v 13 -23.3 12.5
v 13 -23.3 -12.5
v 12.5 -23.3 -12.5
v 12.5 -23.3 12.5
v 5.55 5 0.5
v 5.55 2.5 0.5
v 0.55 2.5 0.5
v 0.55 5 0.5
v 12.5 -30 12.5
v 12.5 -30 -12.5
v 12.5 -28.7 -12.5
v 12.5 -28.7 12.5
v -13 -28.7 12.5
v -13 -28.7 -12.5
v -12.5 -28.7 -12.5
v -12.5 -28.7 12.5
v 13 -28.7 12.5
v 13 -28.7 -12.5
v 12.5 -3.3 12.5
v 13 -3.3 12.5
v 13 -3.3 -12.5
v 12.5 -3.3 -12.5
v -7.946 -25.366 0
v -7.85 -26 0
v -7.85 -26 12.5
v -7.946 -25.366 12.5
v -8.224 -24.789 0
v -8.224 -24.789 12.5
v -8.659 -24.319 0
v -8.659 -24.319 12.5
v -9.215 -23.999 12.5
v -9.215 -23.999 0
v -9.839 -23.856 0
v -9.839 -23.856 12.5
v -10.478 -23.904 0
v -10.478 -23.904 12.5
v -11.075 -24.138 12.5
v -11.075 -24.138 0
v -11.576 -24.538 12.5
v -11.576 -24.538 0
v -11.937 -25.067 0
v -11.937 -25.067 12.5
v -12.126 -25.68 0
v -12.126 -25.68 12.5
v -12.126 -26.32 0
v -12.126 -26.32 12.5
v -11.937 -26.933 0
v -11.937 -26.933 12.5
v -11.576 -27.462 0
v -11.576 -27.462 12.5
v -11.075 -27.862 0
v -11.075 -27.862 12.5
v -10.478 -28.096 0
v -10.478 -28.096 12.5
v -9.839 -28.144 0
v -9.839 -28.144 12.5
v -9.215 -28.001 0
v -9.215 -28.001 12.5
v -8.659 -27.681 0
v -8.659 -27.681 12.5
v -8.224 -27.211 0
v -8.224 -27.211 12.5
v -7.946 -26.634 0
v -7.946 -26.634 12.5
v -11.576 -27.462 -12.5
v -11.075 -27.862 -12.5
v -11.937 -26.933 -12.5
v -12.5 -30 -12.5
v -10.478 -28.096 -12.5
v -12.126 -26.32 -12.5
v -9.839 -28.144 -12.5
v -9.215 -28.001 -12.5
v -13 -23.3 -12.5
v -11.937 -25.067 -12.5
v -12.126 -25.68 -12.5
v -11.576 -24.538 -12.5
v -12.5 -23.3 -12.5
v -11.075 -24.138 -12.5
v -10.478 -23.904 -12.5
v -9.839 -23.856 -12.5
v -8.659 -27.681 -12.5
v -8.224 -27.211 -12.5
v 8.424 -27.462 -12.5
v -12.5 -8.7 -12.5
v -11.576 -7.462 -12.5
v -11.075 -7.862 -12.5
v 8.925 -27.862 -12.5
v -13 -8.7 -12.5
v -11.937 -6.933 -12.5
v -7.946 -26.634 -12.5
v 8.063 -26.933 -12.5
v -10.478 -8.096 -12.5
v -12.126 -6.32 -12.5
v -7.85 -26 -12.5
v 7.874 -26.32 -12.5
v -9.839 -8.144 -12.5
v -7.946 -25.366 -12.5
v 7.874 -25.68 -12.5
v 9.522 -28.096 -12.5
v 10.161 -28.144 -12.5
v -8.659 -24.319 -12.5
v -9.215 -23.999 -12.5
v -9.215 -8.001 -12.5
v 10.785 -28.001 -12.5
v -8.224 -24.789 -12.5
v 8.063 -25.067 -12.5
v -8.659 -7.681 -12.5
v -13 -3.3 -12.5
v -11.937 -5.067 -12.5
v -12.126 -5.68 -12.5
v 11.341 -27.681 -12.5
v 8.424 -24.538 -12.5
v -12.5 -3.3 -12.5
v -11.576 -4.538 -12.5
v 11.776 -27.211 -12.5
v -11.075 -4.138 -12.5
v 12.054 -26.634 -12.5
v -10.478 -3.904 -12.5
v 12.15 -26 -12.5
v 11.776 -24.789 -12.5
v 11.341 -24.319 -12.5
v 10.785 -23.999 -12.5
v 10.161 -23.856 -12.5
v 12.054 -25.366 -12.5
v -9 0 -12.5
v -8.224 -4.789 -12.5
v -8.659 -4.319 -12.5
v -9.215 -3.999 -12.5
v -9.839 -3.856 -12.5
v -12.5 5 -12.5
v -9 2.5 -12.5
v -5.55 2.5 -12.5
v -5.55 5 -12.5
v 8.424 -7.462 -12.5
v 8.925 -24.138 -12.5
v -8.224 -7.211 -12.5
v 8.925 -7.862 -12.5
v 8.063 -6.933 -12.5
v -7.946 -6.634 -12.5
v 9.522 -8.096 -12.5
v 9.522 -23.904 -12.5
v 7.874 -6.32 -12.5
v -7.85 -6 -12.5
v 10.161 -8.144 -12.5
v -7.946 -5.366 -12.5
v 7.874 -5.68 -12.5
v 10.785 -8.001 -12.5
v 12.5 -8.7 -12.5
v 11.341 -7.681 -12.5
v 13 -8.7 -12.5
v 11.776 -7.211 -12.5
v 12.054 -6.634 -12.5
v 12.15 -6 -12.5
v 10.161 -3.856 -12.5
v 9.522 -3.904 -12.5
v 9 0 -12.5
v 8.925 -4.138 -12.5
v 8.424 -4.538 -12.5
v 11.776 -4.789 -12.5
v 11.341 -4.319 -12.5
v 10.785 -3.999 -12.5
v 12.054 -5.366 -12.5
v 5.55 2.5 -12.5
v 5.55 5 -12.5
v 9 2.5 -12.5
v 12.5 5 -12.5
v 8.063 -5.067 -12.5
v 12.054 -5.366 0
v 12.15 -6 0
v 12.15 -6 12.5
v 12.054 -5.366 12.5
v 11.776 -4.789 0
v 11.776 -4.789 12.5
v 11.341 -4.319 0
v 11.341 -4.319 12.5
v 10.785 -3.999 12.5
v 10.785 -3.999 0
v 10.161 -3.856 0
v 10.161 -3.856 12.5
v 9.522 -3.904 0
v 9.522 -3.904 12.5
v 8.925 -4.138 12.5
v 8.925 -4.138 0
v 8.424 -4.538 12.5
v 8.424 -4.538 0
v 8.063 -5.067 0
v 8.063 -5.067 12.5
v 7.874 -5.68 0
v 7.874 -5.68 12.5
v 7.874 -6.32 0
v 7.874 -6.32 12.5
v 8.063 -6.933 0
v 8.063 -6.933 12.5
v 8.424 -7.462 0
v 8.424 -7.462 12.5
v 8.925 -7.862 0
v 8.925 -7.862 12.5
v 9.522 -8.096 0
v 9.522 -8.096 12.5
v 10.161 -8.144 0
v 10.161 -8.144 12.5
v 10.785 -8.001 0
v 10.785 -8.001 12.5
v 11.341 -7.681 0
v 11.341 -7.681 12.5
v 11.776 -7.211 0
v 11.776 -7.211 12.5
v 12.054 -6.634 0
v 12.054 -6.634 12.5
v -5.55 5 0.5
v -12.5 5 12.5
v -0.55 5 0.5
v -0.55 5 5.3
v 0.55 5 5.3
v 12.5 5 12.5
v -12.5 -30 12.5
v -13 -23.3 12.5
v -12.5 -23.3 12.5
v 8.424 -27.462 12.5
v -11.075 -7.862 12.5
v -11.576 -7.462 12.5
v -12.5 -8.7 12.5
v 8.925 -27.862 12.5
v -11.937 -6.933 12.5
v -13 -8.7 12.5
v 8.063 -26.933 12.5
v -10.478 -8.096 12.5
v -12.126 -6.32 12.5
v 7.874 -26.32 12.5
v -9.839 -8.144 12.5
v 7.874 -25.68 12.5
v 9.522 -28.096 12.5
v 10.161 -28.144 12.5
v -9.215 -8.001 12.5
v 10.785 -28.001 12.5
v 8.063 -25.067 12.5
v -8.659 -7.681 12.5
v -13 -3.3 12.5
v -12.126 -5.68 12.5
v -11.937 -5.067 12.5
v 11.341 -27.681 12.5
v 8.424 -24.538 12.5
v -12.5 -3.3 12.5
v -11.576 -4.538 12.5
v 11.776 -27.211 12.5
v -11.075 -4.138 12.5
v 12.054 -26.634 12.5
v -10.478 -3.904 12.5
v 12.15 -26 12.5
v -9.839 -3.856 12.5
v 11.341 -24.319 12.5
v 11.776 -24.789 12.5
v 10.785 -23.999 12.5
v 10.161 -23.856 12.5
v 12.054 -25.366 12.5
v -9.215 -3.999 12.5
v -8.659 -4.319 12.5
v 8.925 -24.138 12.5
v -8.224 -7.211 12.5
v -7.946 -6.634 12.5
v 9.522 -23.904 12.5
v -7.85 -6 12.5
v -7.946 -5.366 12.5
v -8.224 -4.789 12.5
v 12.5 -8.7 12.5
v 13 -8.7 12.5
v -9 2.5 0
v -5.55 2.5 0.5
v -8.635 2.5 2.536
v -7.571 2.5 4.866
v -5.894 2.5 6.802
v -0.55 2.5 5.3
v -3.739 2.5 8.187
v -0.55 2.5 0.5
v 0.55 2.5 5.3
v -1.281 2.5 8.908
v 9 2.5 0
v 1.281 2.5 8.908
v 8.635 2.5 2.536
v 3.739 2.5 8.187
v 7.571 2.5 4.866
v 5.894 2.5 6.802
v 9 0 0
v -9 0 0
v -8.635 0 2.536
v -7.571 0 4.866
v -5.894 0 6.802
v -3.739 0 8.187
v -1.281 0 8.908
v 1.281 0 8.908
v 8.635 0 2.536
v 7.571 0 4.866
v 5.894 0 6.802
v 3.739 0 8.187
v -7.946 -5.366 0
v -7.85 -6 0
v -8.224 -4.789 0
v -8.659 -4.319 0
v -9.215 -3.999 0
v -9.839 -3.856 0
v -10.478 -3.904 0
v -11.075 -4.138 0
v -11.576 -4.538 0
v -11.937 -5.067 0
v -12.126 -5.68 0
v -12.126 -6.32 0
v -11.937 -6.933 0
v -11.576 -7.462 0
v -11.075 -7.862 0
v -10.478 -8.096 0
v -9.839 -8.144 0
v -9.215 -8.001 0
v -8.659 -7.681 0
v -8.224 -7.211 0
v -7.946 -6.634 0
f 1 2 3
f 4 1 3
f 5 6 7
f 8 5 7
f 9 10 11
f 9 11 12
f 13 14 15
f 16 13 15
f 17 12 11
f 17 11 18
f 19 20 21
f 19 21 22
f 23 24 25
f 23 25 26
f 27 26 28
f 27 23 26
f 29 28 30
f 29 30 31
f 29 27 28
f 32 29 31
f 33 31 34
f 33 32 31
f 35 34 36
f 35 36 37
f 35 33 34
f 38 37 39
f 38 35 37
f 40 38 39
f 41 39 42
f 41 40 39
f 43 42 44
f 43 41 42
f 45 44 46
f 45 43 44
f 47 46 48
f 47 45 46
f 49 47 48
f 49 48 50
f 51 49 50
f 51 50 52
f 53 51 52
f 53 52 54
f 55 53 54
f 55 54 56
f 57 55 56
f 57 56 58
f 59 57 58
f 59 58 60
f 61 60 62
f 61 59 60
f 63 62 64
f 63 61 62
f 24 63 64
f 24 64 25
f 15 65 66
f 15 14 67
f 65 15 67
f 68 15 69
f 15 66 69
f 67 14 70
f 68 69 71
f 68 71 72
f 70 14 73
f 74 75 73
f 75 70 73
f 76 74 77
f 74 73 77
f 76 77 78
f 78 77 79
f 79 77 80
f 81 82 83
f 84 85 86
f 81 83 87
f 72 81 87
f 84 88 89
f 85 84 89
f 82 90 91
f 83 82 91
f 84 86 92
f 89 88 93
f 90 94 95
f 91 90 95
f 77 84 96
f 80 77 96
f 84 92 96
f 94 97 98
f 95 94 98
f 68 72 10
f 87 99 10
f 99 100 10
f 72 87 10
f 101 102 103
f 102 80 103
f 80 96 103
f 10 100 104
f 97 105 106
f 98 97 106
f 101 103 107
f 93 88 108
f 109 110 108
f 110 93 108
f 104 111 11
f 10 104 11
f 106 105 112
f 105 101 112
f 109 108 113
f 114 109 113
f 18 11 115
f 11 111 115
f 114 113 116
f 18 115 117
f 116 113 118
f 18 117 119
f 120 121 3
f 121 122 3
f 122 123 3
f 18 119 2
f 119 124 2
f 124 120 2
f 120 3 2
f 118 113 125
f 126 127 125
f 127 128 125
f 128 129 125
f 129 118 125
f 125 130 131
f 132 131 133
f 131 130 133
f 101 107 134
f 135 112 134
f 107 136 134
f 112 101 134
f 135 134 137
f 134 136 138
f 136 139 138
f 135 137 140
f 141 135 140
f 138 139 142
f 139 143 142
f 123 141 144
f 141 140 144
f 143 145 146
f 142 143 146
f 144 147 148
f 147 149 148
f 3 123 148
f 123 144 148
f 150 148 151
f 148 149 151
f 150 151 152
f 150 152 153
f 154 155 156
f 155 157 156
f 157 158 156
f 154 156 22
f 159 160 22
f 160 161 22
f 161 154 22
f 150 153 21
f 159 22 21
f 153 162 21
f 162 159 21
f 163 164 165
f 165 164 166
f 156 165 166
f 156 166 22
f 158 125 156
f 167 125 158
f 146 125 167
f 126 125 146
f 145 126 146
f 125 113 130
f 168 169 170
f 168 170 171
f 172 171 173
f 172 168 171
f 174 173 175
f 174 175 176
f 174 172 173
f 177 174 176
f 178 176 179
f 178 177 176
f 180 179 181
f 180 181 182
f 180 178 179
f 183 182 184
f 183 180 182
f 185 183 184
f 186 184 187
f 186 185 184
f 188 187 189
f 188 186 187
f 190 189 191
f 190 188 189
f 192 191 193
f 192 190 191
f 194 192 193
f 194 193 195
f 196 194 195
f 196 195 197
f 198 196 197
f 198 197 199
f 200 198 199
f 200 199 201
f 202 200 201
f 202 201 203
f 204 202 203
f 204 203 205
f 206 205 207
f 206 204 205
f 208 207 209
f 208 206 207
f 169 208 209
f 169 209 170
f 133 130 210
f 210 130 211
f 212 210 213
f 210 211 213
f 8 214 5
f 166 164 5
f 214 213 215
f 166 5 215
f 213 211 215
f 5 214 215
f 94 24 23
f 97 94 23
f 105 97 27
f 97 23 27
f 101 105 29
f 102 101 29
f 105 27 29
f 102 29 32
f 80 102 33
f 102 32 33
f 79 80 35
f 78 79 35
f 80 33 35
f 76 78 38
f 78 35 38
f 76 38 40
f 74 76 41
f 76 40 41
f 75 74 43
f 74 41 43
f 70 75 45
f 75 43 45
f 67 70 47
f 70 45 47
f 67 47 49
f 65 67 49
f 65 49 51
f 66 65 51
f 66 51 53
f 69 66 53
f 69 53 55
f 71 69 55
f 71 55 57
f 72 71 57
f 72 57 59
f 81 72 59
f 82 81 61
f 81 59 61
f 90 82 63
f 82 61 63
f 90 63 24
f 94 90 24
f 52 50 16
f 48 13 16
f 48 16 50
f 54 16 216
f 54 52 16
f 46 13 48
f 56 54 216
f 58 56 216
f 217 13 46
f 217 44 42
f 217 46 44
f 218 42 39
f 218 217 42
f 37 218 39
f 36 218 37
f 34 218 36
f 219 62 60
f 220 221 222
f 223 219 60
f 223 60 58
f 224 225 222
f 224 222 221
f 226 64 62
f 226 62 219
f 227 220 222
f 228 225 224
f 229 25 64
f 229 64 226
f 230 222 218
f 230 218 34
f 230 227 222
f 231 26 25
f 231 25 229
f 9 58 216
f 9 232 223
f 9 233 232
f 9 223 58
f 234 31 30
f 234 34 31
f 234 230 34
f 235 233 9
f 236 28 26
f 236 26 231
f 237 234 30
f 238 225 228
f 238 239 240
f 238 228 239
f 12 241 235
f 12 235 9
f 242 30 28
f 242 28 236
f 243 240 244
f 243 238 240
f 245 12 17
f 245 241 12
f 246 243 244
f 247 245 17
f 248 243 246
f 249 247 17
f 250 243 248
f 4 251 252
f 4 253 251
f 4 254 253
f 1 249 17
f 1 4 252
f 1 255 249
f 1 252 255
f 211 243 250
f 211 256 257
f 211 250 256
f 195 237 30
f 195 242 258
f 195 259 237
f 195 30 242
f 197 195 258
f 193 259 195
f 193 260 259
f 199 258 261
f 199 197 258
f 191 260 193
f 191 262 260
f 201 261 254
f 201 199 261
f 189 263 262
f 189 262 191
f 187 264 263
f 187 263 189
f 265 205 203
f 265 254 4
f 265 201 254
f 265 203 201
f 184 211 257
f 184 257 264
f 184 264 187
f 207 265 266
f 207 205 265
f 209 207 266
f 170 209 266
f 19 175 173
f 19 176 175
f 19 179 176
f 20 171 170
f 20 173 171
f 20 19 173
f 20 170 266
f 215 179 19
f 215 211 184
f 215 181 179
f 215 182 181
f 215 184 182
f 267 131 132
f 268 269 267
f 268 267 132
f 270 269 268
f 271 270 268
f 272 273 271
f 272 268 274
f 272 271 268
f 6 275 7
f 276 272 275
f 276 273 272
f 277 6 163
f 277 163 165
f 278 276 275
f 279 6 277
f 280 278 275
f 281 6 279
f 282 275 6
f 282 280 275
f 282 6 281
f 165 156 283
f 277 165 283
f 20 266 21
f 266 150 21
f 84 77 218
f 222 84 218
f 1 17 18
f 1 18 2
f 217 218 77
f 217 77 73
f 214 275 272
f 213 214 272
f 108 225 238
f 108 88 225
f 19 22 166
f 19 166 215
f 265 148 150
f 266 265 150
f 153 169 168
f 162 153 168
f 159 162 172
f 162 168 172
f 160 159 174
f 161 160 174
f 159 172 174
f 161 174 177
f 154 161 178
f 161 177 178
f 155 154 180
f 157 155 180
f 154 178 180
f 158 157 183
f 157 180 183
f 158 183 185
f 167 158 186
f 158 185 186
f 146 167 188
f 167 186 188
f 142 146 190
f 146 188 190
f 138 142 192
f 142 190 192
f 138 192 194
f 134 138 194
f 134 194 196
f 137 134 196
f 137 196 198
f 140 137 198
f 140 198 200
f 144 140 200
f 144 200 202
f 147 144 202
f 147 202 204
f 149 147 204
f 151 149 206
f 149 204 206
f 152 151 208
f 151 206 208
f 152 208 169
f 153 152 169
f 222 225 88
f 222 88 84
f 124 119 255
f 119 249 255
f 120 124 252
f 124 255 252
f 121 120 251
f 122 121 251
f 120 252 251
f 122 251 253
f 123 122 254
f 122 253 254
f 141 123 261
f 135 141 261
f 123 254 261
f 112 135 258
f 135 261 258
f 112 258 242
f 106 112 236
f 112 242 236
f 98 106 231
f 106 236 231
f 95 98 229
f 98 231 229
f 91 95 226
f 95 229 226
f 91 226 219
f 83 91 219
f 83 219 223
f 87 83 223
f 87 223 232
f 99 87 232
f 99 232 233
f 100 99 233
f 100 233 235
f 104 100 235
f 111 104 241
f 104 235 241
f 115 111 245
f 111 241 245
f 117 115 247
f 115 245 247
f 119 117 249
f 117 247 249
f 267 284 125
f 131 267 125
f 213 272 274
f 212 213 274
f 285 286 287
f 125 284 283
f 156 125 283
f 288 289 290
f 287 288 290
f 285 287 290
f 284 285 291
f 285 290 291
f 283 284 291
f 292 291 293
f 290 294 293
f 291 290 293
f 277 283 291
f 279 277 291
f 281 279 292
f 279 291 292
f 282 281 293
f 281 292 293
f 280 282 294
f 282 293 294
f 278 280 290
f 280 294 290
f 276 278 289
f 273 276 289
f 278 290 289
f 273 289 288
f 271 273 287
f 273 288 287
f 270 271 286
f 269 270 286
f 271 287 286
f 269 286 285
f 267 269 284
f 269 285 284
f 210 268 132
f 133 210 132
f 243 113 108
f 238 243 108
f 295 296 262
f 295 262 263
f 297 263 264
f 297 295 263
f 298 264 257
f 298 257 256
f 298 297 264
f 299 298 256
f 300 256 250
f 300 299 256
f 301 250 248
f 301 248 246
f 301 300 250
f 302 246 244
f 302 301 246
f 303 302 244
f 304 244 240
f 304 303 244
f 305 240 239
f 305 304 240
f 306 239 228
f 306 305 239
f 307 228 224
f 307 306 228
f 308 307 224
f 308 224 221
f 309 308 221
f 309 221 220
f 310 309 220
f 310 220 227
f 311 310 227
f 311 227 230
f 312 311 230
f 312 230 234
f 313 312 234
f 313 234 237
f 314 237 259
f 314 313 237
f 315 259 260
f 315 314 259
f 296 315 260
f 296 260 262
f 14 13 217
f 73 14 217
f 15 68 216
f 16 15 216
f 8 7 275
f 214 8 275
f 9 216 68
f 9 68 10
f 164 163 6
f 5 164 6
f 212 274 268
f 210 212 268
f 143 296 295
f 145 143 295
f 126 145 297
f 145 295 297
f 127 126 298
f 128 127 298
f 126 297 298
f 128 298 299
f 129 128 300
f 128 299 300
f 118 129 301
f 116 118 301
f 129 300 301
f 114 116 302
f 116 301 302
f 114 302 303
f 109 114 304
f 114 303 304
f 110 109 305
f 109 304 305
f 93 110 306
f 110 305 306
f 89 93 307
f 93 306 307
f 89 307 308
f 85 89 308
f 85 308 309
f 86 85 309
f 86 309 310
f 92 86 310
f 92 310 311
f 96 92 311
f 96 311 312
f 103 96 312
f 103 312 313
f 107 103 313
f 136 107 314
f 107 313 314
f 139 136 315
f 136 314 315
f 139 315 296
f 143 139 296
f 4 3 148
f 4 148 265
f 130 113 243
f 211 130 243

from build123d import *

# Parameters (mm, degrees)
F0_W      = 25
F0_H      = 25
F1_DEPTH  = 30
F2_W      = 25
F2_H      = 25
F3_DEPTH  = 5
F5_DEPTH  = 2.5
F7_DEPTH  = 25
F9_W      = 13
F9_H      = 5.4
F10_DEPTH = 12.5
F8_R      = 2.15
F11_DEPTH = 12.5


with BuildPart() as f1:
    # F0 (on Front) → F1 (new body)
    with BuildSketch(Plane.XZ):
        Rectangle(F0_W, F0_H)
    extrude(amount=F1_DEPTH)

    # F2 (on Front) → F3 (join)
    with BuildSketch(Plane.XZ):
        Rectangle(F2_W, F2_H)
    extrude(amount=-F3_DEPTH)

    # F4 (on Front) → F5 (cut)
    with BuildSketch(Plane.XZ):
        with BuildLine():
            ThreePointArc((-9, 0), (0, -9), (9, 0))
            ThreePointArc((9, 0), (0, 9), (-9, 0))
        make_face()
        with BuildLine():
            Line((9, -12.5), (9, 0))
            ThreePointArc((9, 0), (0, -9), (-9, 0))
            Line((-9, 0), (-9, -12.5))
            Line((-9, -12.5), (9, -12.5))
        make_face()
    extrude(amount=-F5_DEPTH, mode=Mode.SUBTRACT)

    # F6 (on Front) → F7 (cut)
    with BuildSketch(Plane.XZ):
        Polygon((0.55, 0.5), (0.55, 5.3), (-0.55, 5.3), (-0.55, 0.5), (-5.55, 0.5), (-5.55, -12.5), (5.55, -12.5), (5.55, 0.5), align=None)
    extrude(amount=-F7_DEPTH, mode=Mode.SUBTRACT)

    # F9 (on Top) → F10 (join, symmetric)
    with BuildSketch(Plane.XY):
        with Locations((-6.5, -6)):
            Rectangle(F9_W, F9_H)
        with Locations((6.5, -6)):
            Rectangle(F9_W, F9_H)
        with Locations((-6.5, -26)):
            Rectangle(F9_W, F9_H)
        with Locations((6.5, -26)):
            Rectangle(F9_W, F9_H)
    extrude(amount=F10_DEPTH, both=True)

    # F8 (on Top) → F11 (cut, symmetric)
    with BuildSketch(Plane.XY):
        with Locations((-10, -6)):
            Circle(F8_R)
        with Locations((-10, -26)):
            Circle(F8_R)
        with Locations((10, -6)):
            Circle(F8_R)
        with Locations((10, -26)):
            Circle(F8_R)
    extrude(amount=F11_DEPTH, both=True, mode=Mode.SUBTRACT)


solid = f1.part
